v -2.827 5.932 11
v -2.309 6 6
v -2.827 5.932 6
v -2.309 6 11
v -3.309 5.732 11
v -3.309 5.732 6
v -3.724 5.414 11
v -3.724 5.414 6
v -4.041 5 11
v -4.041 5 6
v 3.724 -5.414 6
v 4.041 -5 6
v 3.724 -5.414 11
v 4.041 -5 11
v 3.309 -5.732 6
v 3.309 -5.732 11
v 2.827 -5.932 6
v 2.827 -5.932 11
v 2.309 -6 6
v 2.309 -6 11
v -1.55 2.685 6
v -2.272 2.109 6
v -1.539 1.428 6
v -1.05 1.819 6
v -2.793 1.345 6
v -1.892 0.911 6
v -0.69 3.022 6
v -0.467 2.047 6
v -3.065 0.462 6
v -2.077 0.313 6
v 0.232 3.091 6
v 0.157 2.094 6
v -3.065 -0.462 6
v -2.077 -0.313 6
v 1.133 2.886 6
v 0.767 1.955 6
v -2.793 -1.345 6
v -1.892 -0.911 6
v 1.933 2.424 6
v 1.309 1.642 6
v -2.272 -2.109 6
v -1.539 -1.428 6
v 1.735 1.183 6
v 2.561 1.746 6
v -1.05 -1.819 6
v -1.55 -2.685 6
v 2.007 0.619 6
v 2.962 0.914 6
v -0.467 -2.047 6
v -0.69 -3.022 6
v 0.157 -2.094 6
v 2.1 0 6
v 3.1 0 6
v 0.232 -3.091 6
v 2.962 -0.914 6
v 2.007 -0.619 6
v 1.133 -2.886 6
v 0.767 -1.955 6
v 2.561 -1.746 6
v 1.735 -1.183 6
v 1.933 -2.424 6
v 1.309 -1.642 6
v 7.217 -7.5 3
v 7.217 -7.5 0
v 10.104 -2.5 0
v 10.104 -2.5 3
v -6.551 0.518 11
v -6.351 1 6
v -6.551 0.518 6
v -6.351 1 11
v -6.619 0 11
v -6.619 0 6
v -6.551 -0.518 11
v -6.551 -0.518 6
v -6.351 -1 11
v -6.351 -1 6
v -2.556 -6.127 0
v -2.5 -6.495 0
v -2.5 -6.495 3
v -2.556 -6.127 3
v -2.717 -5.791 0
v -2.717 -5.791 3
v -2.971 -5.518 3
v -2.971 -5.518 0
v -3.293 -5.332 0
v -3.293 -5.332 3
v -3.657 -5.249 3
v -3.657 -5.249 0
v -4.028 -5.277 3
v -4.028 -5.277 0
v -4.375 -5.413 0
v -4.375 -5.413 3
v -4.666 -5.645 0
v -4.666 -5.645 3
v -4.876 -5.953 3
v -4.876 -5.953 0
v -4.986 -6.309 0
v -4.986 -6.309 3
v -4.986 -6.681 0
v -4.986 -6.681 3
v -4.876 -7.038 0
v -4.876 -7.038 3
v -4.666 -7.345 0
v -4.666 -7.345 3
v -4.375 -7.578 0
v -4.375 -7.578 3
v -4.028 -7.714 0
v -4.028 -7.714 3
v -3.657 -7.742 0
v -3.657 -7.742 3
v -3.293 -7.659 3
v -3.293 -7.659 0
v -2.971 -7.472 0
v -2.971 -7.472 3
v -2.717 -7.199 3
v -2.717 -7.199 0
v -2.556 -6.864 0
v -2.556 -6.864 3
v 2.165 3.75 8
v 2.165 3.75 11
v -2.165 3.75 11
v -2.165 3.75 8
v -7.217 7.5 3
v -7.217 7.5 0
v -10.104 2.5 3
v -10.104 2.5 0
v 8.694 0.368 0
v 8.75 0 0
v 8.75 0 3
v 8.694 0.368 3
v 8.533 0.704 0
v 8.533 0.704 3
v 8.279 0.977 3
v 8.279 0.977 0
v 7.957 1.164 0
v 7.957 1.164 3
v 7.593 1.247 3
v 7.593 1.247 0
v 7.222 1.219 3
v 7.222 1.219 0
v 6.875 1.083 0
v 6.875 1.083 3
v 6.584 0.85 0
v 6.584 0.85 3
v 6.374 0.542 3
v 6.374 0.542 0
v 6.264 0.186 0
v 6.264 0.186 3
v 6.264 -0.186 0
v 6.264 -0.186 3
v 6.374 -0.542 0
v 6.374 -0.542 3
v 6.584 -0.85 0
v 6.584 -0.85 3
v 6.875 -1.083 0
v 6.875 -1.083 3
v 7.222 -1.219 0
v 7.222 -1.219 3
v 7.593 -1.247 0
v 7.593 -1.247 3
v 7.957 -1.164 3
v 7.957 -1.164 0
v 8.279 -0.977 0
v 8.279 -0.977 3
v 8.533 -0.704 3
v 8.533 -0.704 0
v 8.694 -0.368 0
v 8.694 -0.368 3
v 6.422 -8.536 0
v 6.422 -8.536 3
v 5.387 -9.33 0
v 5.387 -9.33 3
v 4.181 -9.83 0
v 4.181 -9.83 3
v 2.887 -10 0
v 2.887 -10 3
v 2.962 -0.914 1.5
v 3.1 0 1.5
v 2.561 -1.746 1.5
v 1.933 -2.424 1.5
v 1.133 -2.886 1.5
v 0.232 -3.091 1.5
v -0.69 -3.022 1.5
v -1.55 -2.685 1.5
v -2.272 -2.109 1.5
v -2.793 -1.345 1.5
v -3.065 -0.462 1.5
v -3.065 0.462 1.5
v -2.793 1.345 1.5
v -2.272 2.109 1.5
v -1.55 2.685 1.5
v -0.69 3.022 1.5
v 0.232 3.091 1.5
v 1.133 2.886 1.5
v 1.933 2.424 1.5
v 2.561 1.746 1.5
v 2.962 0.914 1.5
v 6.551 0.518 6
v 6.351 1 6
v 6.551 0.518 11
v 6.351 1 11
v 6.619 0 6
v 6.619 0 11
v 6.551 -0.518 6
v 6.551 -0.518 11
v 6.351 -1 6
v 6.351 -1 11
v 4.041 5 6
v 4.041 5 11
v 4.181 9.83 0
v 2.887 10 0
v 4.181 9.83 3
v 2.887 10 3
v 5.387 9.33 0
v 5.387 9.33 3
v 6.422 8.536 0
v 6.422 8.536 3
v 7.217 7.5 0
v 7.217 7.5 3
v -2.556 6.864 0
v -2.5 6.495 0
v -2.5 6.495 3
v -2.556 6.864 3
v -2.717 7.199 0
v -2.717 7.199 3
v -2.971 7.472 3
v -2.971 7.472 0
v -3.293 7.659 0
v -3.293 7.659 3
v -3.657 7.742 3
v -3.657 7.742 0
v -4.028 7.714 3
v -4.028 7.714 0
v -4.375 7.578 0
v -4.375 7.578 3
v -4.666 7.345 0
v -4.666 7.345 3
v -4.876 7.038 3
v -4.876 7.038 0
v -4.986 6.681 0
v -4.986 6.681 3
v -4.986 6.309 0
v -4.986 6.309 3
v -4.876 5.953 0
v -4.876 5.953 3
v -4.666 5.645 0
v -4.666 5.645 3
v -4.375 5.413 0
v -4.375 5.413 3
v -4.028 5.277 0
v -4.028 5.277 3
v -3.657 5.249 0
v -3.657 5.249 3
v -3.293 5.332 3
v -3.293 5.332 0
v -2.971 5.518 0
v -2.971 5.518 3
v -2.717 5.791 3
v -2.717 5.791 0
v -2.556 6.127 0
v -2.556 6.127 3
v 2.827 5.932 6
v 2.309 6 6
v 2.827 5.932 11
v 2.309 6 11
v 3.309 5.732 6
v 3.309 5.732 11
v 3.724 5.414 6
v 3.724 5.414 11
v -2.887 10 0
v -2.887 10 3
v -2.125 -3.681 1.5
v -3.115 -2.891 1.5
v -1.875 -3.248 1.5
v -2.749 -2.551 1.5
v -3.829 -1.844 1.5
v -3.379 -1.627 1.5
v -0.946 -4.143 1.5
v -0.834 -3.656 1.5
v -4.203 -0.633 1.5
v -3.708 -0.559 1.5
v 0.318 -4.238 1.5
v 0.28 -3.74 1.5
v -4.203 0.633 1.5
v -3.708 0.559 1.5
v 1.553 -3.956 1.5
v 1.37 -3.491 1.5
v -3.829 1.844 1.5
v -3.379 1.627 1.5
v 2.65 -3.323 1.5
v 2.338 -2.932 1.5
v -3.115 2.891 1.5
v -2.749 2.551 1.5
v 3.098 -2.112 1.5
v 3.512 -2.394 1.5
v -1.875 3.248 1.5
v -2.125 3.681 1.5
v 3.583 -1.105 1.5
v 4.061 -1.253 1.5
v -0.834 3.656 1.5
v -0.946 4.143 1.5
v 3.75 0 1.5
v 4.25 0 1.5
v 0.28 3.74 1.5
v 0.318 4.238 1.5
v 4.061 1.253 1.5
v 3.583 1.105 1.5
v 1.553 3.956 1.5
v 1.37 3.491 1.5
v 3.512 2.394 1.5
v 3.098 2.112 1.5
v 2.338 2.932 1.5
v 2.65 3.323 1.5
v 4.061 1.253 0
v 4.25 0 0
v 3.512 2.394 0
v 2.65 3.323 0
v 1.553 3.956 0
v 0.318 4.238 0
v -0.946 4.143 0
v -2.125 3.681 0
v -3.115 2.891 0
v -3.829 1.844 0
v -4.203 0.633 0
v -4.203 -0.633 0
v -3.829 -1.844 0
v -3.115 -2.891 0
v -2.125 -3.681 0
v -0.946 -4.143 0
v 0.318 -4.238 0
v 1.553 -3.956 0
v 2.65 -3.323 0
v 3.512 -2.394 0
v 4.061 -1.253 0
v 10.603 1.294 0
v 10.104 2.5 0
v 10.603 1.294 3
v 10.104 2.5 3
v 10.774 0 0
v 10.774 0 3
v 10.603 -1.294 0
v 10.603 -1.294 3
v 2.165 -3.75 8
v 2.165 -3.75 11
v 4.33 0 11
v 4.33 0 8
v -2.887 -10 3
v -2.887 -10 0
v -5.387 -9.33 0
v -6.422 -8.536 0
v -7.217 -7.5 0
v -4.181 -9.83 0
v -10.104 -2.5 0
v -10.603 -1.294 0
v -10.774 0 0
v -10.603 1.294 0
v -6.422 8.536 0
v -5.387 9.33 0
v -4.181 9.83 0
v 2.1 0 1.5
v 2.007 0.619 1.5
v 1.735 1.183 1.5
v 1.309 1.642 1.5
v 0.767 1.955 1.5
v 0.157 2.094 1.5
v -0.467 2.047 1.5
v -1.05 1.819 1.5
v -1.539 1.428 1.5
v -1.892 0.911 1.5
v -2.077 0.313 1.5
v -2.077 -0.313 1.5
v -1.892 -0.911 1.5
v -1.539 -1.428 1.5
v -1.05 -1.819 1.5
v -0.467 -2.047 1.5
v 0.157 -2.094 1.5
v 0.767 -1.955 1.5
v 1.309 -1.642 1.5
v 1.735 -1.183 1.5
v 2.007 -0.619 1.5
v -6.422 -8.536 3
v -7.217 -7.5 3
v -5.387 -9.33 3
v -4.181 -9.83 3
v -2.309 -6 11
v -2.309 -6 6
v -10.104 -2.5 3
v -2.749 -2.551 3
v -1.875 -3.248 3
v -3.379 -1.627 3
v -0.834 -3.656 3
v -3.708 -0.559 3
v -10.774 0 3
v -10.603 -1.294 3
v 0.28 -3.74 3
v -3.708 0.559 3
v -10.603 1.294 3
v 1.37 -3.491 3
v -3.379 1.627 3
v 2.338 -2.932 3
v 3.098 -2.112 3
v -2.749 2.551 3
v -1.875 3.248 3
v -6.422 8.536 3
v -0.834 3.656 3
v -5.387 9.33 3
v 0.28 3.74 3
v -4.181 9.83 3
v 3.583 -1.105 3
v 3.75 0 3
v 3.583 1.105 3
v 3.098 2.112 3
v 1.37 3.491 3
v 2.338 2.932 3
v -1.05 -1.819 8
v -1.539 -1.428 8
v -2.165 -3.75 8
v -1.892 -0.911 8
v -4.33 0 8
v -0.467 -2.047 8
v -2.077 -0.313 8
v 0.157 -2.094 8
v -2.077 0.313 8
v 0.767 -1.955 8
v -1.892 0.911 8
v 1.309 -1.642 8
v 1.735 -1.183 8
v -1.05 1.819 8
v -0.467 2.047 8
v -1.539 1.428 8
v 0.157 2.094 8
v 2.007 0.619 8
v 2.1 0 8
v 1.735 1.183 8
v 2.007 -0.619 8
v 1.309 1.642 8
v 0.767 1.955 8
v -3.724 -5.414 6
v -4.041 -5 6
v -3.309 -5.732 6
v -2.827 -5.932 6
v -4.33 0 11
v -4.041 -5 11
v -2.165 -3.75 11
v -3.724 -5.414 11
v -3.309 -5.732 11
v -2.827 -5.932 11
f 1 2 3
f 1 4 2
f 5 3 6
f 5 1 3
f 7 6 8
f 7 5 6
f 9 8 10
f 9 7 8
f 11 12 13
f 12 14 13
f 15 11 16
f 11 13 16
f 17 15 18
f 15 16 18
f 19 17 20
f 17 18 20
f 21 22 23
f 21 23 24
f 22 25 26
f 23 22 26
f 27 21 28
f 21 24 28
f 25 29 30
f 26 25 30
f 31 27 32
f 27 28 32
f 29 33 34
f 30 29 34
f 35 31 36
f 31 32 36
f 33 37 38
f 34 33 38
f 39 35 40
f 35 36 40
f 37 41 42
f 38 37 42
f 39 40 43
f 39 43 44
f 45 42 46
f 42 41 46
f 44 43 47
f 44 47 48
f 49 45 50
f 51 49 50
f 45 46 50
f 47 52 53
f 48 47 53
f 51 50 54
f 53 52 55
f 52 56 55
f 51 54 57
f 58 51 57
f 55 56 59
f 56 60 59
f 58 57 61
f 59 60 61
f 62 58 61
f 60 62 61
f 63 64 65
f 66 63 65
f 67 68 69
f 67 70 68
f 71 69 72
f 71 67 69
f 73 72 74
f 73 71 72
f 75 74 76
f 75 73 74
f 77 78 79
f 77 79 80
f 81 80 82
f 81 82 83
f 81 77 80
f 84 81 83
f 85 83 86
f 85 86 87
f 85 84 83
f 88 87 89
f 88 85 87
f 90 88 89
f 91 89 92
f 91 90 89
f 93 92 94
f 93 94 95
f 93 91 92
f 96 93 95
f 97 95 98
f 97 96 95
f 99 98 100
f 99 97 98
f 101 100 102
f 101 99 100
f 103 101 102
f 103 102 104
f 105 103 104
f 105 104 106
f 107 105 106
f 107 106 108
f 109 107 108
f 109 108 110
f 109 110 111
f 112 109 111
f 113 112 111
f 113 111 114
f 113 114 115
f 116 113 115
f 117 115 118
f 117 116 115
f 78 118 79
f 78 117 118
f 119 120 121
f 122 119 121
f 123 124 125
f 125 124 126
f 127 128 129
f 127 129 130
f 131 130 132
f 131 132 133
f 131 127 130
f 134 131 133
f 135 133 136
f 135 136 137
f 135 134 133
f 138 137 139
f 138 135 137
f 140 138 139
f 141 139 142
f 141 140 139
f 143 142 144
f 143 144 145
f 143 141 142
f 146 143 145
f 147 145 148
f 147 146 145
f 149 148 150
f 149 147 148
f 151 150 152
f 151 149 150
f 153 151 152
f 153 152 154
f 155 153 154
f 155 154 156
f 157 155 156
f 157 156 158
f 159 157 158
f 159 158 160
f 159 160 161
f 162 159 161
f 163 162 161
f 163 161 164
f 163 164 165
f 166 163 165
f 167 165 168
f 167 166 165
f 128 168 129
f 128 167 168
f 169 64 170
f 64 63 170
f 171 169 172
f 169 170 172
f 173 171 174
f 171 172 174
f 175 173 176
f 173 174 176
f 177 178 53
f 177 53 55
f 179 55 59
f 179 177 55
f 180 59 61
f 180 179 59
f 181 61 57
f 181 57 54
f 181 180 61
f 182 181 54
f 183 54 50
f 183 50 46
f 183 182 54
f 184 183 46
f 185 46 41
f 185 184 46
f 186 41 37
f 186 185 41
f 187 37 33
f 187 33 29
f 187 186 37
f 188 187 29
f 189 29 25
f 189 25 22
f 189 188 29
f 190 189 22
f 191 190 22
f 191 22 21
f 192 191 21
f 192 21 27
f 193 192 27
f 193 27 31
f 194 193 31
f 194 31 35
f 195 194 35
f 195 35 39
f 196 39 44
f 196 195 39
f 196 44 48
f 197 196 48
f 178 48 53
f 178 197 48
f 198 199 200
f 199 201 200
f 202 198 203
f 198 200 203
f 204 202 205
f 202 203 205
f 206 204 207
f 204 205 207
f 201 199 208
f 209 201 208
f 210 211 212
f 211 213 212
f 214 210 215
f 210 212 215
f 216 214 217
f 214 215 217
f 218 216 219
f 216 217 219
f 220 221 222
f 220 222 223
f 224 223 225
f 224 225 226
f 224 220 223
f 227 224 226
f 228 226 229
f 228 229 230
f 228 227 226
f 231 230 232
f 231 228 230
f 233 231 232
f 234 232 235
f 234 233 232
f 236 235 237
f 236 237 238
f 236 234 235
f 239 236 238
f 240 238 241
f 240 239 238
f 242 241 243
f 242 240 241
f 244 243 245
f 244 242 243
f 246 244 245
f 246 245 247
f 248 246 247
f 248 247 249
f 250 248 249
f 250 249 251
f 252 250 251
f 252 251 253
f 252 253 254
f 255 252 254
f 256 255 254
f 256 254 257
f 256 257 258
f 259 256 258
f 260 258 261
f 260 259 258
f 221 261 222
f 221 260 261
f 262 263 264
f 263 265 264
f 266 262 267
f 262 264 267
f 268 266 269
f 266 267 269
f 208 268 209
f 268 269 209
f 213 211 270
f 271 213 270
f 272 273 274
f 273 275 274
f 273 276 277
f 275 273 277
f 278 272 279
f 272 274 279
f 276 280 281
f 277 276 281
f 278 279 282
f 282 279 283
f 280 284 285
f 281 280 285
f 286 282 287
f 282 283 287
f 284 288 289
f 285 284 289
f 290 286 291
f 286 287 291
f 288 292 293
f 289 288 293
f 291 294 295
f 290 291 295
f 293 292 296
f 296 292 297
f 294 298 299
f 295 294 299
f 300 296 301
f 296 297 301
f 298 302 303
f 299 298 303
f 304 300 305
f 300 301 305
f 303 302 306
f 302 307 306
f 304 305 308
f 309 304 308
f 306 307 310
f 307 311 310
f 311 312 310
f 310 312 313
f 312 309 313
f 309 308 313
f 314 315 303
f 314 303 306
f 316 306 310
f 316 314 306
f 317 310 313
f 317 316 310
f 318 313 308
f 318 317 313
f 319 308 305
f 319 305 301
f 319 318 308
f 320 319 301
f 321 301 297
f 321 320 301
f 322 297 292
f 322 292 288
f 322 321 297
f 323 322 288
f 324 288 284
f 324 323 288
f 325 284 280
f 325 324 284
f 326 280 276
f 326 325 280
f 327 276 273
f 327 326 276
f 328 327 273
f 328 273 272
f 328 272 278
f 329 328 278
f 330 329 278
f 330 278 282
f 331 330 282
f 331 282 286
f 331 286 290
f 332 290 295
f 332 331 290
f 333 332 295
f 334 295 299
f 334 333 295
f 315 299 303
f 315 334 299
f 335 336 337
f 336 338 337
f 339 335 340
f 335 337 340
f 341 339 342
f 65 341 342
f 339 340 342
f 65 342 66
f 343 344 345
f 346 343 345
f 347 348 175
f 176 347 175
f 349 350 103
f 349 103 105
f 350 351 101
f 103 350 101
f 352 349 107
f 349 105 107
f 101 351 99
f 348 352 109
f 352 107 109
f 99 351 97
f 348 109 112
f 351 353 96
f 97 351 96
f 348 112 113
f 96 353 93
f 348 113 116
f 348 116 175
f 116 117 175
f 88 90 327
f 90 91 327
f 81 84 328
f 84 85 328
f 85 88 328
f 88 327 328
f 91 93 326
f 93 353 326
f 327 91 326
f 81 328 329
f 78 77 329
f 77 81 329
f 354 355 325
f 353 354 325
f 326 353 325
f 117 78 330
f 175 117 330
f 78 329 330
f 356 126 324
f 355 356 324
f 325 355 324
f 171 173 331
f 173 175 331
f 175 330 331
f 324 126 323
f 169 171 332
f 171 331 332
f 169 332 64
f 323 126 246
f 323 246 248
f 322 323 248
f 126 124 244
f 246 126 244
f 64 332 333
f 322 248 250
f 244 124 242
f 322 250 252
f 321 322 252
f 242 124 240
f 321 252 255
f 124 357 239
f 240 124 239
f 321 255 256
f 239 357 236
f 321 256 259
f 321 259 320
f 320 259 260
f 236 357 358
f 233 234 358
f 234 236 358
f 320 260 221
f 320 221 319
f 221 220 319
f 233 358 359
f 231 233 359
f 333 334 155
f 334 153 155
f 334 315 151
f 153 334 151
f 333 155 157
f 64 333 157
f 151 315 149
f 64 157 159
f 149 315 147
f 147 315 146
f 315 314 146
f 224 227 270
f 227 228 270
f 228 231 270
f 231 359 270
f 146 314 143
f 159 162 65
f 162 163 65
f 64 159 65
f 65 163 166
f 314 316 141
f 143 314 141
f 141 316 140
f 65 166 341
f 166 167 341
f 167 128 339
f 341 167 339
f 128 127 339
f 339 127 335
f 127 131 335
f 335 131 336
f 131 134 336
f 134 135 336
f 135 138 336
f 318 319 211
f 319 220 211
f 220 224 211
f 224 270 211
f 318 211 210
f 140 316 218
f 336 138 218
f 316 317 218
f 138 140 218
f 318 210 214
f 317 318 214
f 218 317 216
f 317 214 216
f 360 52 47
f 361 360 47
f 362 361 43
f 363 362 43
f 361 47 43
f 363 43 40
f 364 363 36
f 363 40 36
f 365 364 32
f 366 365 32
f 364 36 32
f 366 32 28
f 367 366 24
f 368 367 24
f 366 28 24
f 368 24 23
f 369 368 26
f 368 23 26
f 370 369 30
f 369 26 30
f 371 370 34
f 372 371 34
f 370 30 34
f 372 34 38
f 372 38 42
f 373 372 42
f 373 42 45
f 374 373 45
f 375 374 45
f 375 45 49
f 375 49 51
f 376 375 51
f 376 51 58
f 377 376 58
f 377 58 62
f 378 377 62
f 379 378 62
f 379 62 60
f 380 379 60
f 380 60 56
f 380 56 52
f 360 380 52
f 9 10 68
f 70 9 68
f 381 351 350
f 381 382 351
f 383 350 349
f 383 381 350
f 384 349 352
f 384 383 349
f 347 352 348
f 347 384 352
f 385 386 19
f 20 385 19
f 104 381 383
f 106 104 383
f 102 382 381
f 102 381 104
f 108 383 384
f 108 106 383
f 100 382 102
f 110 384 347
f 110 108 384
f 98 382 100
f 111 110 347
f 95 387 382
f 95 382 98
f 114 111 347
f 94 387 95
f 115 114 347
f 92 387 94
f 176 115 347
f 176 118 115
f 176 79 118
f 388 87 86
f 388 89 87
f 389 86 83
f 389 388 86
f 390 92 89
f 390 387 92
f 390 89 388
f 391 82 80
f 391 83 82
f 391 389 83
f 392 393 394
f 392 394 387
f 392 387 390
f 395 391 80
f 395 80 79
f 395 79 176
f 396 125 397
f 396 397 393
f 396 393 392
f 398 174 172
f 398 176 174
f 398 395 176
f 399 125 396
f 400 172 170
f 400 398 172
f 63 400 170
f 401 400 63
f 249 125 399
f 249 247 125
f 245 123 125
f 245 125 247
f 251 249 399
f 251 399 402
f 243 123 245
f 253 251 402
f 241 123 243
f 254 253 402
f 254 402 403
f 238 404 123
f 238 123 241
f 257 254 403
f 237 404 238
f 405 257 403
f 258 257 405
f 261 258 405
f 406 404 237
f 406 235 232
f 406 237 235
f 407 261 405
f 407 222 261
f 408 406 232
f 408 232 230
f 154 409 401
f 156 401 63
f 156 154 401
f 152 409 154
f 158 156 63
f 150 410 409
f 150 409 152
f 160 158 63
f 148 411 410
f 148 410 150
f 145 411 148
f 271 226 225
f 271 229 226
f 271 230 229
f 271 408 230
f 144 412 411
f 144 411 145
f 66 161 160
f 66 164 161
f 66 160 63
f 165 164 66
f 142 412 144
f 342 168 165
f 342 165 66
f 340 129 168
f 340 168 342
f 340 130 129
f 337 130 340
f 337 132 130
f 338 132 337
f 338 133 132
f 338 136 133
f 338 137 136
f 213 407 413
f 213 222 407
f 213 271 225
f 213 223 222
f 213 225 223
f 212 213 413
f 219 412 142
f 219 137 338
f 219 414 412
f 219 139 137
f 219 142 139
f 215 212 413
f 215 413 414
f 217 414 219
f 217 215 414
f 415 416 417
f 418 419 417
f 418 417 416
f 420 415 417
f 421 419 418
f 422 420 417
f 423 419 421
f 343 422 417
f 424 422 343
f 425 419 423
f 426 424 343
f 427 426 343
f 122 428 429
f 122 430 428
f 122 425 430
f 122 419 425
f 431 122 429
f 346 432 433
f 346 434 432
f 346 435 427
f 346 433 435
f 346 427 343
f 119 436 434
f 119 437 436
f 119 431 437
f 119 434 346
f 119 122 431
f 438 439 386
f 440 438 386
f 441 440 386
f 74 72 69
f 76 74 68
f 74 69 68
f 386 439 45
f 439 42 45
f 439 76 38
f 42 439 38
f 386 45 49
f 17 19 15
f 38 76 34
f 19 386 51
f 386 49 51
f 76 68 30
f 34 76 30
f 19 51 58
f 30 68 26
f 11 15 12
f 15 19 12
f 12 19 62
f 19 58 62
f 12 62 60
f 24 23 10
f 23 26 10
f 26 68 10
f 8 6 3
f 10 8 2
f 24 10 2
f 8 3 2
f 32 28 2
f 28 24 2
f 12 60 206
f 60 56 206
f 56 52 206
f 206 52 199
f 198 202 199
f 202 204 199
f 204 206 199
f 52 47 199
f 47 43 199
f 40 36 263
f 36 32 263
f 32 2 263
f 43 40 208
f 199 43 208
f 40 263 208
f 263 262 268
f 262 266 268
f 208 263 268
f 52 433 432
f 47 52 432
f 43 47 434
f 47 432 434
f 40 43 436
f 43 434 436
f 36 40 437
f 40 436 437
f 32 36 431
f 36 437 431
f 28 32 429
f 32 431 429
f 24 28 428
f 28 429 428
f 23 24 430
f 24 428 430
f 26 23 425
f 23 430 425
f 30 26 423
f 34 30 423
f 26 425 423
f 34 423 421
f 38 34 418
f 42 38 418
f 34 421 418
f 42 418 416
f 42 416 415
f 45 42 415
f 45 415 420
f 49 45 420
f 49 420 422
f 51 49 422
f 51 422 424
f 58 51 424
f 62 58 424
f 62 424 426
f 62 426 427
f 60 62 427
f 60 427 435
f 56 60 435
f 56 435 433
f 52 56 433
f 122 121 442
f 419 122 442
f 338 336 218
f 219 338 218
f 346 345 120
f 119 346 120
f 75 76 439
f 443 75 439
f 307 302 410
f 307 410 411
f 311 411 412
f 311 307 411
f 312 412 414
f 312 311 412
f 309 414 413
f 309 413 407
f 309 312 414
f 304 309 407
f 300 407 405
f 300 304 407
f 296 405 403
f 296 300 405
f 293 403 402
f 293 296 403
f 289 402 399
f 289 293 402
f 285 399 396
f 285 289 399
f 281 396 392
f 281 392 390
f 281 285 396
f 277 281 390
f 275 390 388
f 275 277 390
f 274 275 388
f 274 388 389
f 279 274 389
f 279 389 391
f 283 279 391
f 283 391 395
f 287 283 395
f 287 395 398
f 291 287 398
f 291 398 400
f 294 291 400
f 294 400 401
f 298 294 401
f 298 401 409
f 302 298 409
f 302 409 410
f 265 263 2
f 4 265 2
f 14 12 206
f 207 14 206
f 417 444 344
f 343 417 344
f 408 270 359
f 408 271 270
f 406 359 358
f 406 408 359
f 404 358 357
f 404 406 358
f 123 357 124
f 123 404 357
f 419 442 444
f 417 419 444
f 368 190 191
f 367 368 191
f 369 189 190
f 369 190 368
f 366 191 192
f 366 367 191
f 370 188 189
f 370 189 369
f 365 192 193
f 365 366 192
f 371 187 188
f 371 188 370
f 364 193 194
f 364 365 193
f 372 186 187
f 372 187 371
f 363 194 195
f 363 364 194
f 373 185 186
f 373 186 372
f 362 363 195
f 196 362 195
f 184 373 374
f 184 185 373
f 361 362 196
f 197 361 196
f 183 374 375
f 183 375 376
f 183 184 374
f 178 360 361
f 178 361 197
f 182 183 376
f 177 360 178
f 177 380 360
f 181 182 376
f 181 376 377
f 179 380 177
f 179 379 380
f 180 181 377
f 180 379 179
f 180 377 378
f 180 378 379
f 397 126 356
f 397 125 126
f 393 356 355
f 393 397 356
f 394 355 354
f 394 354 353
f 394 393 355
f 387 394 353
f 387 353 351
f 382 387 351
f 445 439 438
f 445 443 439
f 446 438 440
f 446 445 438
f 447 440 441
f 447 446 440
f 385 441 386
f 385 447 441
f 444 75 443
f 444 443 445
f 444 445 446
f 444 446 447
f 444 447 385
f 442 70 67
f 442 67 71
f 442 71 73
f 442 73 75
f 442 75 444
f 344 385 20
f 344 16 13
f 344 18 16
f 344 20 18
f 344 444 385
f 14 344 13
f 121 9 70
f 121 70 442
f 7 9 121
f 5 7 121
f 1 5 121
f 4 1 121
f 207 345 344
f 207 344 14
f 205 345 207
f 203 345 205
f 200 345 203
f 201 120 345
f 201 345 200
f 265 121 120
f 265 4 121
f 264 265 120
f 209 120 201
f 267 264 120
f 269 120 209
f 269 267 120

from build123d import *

# Parameters (mm, degrees)
F0_R      = 1.25
F0_R_2    = 4.25
F0_R_3    = 3.75
F1_DEPTH  = 3
F2_DEPTH  = 1.5
F3_R      = 5
F4_R      = 3.1
F5_DEPTH  = 4.5
F7_DEPTH  = 5
F8_R      = 2.1
F9_DEPTH  = 3
F10_DEPTH = 11.001
F11_R     = 2


with BuildPart() as f1:
    # F0 (on Top) → F1 (new body)
    with BuildSketch(Plane.XY):
        Polygon((5.773503, 10), (-5.773503, 10), (-11.547005, 0), (-5.773503, -10), (5.773503, -10), (11.547005, 0), align=None)
        with Locations((-3.75, -6.495191)):
            Circle(F0_R, mode=Mode.SUBTRACT)
        with Locations((-3.75, 6.495191)):
            Circle(F0_R, mode=Mode.SUBTRACT)
        Circle(F0_R_2, mode=Mode.SUBTRACT)
        with Locations((7.5, 0)):
            Circle(F0_R, mode=Mode.SUBTRACT)
        Circle(F0_R_2)
        Circle(F0_R_3, mode=Mode.SUBTRACT)
    extrude(amount=F1_DEPTH)

    # F0 (on Top) → F2 (cut)
    with BuildSketch(Plane.XY):
        Circle(F0_R_2)
        Circle(F0_R_3, mode=Mode.SUBTRACT)
    extrude(amount=F2_DEPTH, mode=Mode.SUBTRACT)

    # F3
    f3_edges = [f1.edges().sort_by_distance(p)[0] for p in [
        (5.773503, -10, 1.5),
        (11.547005, 0, 1.5),
        (-5.773503, -10, 1.5),
        (-11.547005, 0, 1.5),
        (-5.773503, 10, 1.5),
        (5.773503, 10, 1.5),
    ]]
    fillet(f3_edges, radius=F3_R)


with BuildPart() as f5:
    # F4 (on face) → F5 (new body)
    with BuildSketch(Plane(origin=(0, 0, 1.5), x_dir=(1, 0, 0), z_dir=(0, 0, -1))):
        Circle(F4_R)
    extrude(amount=-F5_DEPTH)


with BuildPart() as f7:
    # F6 (on face) → F7 (new body)
    with BuildSketch(Plane.XY.offset(6)):
        Polygon((3.464102, 6), (-3.464102, 6), (-6.928203, 0), (-3.464102, -6), (3.464102, -6), (6.928203, 0), align=None)
    extrude(amount=F7_DEPTH)

    # F8 (on face) → F9 (cut)
    with BuildSketch(Plane.XY.offset(11)):
        Polygon((2.165064, 3.75), (-2.165064, 3.75), (-4.330127, 0), (-2.165064, -3.75), (2.165064, -3.75), (4.330127, 0), align=None)
        Circle(F8_R, mode=Mode.SUBTRACT)
        Circle(F8_R)
    extrude(amount=-F9_DEPTH, mode=Mode.SUBTRACT)


with BuildPart() as f10_tool:
    # F8 (on face) → F10 (new body, through all)
    with BuildSketch(Plane.XY.offset(11)):
        Circle(F8_R)
    extrude(amount=-F10_DEPTH)


with BuildPart() as f5_1:
    add(f5.part)

    # F10: cut by f10_tool
    add(f10_tool.part, mode=Mode.SUBTRACT)


with BuildPart() as f7_1:
    add(f7.part)

    # F10: cut by f10_tool
    add(f10_tool.part, mode=Mode.SUBTRACT)

    # F11
    f11_edges = [f7_1.edges().sort_by_distance(p)[0] for p in [
        (6.928203, 0, 8.5),
        (3.464102, -6, 8.5),
        (-3.464102, -6, 8.5),
        (3.464102, 6, 8.5),
        (-3.464102, 6, 8.5),
        (-6.928203, 0, 8.5),
    ]]
    fillet(f11_edges, radius=F11_R)


solid = Compound([f1.part, f5_1.part, f7_1.part])
